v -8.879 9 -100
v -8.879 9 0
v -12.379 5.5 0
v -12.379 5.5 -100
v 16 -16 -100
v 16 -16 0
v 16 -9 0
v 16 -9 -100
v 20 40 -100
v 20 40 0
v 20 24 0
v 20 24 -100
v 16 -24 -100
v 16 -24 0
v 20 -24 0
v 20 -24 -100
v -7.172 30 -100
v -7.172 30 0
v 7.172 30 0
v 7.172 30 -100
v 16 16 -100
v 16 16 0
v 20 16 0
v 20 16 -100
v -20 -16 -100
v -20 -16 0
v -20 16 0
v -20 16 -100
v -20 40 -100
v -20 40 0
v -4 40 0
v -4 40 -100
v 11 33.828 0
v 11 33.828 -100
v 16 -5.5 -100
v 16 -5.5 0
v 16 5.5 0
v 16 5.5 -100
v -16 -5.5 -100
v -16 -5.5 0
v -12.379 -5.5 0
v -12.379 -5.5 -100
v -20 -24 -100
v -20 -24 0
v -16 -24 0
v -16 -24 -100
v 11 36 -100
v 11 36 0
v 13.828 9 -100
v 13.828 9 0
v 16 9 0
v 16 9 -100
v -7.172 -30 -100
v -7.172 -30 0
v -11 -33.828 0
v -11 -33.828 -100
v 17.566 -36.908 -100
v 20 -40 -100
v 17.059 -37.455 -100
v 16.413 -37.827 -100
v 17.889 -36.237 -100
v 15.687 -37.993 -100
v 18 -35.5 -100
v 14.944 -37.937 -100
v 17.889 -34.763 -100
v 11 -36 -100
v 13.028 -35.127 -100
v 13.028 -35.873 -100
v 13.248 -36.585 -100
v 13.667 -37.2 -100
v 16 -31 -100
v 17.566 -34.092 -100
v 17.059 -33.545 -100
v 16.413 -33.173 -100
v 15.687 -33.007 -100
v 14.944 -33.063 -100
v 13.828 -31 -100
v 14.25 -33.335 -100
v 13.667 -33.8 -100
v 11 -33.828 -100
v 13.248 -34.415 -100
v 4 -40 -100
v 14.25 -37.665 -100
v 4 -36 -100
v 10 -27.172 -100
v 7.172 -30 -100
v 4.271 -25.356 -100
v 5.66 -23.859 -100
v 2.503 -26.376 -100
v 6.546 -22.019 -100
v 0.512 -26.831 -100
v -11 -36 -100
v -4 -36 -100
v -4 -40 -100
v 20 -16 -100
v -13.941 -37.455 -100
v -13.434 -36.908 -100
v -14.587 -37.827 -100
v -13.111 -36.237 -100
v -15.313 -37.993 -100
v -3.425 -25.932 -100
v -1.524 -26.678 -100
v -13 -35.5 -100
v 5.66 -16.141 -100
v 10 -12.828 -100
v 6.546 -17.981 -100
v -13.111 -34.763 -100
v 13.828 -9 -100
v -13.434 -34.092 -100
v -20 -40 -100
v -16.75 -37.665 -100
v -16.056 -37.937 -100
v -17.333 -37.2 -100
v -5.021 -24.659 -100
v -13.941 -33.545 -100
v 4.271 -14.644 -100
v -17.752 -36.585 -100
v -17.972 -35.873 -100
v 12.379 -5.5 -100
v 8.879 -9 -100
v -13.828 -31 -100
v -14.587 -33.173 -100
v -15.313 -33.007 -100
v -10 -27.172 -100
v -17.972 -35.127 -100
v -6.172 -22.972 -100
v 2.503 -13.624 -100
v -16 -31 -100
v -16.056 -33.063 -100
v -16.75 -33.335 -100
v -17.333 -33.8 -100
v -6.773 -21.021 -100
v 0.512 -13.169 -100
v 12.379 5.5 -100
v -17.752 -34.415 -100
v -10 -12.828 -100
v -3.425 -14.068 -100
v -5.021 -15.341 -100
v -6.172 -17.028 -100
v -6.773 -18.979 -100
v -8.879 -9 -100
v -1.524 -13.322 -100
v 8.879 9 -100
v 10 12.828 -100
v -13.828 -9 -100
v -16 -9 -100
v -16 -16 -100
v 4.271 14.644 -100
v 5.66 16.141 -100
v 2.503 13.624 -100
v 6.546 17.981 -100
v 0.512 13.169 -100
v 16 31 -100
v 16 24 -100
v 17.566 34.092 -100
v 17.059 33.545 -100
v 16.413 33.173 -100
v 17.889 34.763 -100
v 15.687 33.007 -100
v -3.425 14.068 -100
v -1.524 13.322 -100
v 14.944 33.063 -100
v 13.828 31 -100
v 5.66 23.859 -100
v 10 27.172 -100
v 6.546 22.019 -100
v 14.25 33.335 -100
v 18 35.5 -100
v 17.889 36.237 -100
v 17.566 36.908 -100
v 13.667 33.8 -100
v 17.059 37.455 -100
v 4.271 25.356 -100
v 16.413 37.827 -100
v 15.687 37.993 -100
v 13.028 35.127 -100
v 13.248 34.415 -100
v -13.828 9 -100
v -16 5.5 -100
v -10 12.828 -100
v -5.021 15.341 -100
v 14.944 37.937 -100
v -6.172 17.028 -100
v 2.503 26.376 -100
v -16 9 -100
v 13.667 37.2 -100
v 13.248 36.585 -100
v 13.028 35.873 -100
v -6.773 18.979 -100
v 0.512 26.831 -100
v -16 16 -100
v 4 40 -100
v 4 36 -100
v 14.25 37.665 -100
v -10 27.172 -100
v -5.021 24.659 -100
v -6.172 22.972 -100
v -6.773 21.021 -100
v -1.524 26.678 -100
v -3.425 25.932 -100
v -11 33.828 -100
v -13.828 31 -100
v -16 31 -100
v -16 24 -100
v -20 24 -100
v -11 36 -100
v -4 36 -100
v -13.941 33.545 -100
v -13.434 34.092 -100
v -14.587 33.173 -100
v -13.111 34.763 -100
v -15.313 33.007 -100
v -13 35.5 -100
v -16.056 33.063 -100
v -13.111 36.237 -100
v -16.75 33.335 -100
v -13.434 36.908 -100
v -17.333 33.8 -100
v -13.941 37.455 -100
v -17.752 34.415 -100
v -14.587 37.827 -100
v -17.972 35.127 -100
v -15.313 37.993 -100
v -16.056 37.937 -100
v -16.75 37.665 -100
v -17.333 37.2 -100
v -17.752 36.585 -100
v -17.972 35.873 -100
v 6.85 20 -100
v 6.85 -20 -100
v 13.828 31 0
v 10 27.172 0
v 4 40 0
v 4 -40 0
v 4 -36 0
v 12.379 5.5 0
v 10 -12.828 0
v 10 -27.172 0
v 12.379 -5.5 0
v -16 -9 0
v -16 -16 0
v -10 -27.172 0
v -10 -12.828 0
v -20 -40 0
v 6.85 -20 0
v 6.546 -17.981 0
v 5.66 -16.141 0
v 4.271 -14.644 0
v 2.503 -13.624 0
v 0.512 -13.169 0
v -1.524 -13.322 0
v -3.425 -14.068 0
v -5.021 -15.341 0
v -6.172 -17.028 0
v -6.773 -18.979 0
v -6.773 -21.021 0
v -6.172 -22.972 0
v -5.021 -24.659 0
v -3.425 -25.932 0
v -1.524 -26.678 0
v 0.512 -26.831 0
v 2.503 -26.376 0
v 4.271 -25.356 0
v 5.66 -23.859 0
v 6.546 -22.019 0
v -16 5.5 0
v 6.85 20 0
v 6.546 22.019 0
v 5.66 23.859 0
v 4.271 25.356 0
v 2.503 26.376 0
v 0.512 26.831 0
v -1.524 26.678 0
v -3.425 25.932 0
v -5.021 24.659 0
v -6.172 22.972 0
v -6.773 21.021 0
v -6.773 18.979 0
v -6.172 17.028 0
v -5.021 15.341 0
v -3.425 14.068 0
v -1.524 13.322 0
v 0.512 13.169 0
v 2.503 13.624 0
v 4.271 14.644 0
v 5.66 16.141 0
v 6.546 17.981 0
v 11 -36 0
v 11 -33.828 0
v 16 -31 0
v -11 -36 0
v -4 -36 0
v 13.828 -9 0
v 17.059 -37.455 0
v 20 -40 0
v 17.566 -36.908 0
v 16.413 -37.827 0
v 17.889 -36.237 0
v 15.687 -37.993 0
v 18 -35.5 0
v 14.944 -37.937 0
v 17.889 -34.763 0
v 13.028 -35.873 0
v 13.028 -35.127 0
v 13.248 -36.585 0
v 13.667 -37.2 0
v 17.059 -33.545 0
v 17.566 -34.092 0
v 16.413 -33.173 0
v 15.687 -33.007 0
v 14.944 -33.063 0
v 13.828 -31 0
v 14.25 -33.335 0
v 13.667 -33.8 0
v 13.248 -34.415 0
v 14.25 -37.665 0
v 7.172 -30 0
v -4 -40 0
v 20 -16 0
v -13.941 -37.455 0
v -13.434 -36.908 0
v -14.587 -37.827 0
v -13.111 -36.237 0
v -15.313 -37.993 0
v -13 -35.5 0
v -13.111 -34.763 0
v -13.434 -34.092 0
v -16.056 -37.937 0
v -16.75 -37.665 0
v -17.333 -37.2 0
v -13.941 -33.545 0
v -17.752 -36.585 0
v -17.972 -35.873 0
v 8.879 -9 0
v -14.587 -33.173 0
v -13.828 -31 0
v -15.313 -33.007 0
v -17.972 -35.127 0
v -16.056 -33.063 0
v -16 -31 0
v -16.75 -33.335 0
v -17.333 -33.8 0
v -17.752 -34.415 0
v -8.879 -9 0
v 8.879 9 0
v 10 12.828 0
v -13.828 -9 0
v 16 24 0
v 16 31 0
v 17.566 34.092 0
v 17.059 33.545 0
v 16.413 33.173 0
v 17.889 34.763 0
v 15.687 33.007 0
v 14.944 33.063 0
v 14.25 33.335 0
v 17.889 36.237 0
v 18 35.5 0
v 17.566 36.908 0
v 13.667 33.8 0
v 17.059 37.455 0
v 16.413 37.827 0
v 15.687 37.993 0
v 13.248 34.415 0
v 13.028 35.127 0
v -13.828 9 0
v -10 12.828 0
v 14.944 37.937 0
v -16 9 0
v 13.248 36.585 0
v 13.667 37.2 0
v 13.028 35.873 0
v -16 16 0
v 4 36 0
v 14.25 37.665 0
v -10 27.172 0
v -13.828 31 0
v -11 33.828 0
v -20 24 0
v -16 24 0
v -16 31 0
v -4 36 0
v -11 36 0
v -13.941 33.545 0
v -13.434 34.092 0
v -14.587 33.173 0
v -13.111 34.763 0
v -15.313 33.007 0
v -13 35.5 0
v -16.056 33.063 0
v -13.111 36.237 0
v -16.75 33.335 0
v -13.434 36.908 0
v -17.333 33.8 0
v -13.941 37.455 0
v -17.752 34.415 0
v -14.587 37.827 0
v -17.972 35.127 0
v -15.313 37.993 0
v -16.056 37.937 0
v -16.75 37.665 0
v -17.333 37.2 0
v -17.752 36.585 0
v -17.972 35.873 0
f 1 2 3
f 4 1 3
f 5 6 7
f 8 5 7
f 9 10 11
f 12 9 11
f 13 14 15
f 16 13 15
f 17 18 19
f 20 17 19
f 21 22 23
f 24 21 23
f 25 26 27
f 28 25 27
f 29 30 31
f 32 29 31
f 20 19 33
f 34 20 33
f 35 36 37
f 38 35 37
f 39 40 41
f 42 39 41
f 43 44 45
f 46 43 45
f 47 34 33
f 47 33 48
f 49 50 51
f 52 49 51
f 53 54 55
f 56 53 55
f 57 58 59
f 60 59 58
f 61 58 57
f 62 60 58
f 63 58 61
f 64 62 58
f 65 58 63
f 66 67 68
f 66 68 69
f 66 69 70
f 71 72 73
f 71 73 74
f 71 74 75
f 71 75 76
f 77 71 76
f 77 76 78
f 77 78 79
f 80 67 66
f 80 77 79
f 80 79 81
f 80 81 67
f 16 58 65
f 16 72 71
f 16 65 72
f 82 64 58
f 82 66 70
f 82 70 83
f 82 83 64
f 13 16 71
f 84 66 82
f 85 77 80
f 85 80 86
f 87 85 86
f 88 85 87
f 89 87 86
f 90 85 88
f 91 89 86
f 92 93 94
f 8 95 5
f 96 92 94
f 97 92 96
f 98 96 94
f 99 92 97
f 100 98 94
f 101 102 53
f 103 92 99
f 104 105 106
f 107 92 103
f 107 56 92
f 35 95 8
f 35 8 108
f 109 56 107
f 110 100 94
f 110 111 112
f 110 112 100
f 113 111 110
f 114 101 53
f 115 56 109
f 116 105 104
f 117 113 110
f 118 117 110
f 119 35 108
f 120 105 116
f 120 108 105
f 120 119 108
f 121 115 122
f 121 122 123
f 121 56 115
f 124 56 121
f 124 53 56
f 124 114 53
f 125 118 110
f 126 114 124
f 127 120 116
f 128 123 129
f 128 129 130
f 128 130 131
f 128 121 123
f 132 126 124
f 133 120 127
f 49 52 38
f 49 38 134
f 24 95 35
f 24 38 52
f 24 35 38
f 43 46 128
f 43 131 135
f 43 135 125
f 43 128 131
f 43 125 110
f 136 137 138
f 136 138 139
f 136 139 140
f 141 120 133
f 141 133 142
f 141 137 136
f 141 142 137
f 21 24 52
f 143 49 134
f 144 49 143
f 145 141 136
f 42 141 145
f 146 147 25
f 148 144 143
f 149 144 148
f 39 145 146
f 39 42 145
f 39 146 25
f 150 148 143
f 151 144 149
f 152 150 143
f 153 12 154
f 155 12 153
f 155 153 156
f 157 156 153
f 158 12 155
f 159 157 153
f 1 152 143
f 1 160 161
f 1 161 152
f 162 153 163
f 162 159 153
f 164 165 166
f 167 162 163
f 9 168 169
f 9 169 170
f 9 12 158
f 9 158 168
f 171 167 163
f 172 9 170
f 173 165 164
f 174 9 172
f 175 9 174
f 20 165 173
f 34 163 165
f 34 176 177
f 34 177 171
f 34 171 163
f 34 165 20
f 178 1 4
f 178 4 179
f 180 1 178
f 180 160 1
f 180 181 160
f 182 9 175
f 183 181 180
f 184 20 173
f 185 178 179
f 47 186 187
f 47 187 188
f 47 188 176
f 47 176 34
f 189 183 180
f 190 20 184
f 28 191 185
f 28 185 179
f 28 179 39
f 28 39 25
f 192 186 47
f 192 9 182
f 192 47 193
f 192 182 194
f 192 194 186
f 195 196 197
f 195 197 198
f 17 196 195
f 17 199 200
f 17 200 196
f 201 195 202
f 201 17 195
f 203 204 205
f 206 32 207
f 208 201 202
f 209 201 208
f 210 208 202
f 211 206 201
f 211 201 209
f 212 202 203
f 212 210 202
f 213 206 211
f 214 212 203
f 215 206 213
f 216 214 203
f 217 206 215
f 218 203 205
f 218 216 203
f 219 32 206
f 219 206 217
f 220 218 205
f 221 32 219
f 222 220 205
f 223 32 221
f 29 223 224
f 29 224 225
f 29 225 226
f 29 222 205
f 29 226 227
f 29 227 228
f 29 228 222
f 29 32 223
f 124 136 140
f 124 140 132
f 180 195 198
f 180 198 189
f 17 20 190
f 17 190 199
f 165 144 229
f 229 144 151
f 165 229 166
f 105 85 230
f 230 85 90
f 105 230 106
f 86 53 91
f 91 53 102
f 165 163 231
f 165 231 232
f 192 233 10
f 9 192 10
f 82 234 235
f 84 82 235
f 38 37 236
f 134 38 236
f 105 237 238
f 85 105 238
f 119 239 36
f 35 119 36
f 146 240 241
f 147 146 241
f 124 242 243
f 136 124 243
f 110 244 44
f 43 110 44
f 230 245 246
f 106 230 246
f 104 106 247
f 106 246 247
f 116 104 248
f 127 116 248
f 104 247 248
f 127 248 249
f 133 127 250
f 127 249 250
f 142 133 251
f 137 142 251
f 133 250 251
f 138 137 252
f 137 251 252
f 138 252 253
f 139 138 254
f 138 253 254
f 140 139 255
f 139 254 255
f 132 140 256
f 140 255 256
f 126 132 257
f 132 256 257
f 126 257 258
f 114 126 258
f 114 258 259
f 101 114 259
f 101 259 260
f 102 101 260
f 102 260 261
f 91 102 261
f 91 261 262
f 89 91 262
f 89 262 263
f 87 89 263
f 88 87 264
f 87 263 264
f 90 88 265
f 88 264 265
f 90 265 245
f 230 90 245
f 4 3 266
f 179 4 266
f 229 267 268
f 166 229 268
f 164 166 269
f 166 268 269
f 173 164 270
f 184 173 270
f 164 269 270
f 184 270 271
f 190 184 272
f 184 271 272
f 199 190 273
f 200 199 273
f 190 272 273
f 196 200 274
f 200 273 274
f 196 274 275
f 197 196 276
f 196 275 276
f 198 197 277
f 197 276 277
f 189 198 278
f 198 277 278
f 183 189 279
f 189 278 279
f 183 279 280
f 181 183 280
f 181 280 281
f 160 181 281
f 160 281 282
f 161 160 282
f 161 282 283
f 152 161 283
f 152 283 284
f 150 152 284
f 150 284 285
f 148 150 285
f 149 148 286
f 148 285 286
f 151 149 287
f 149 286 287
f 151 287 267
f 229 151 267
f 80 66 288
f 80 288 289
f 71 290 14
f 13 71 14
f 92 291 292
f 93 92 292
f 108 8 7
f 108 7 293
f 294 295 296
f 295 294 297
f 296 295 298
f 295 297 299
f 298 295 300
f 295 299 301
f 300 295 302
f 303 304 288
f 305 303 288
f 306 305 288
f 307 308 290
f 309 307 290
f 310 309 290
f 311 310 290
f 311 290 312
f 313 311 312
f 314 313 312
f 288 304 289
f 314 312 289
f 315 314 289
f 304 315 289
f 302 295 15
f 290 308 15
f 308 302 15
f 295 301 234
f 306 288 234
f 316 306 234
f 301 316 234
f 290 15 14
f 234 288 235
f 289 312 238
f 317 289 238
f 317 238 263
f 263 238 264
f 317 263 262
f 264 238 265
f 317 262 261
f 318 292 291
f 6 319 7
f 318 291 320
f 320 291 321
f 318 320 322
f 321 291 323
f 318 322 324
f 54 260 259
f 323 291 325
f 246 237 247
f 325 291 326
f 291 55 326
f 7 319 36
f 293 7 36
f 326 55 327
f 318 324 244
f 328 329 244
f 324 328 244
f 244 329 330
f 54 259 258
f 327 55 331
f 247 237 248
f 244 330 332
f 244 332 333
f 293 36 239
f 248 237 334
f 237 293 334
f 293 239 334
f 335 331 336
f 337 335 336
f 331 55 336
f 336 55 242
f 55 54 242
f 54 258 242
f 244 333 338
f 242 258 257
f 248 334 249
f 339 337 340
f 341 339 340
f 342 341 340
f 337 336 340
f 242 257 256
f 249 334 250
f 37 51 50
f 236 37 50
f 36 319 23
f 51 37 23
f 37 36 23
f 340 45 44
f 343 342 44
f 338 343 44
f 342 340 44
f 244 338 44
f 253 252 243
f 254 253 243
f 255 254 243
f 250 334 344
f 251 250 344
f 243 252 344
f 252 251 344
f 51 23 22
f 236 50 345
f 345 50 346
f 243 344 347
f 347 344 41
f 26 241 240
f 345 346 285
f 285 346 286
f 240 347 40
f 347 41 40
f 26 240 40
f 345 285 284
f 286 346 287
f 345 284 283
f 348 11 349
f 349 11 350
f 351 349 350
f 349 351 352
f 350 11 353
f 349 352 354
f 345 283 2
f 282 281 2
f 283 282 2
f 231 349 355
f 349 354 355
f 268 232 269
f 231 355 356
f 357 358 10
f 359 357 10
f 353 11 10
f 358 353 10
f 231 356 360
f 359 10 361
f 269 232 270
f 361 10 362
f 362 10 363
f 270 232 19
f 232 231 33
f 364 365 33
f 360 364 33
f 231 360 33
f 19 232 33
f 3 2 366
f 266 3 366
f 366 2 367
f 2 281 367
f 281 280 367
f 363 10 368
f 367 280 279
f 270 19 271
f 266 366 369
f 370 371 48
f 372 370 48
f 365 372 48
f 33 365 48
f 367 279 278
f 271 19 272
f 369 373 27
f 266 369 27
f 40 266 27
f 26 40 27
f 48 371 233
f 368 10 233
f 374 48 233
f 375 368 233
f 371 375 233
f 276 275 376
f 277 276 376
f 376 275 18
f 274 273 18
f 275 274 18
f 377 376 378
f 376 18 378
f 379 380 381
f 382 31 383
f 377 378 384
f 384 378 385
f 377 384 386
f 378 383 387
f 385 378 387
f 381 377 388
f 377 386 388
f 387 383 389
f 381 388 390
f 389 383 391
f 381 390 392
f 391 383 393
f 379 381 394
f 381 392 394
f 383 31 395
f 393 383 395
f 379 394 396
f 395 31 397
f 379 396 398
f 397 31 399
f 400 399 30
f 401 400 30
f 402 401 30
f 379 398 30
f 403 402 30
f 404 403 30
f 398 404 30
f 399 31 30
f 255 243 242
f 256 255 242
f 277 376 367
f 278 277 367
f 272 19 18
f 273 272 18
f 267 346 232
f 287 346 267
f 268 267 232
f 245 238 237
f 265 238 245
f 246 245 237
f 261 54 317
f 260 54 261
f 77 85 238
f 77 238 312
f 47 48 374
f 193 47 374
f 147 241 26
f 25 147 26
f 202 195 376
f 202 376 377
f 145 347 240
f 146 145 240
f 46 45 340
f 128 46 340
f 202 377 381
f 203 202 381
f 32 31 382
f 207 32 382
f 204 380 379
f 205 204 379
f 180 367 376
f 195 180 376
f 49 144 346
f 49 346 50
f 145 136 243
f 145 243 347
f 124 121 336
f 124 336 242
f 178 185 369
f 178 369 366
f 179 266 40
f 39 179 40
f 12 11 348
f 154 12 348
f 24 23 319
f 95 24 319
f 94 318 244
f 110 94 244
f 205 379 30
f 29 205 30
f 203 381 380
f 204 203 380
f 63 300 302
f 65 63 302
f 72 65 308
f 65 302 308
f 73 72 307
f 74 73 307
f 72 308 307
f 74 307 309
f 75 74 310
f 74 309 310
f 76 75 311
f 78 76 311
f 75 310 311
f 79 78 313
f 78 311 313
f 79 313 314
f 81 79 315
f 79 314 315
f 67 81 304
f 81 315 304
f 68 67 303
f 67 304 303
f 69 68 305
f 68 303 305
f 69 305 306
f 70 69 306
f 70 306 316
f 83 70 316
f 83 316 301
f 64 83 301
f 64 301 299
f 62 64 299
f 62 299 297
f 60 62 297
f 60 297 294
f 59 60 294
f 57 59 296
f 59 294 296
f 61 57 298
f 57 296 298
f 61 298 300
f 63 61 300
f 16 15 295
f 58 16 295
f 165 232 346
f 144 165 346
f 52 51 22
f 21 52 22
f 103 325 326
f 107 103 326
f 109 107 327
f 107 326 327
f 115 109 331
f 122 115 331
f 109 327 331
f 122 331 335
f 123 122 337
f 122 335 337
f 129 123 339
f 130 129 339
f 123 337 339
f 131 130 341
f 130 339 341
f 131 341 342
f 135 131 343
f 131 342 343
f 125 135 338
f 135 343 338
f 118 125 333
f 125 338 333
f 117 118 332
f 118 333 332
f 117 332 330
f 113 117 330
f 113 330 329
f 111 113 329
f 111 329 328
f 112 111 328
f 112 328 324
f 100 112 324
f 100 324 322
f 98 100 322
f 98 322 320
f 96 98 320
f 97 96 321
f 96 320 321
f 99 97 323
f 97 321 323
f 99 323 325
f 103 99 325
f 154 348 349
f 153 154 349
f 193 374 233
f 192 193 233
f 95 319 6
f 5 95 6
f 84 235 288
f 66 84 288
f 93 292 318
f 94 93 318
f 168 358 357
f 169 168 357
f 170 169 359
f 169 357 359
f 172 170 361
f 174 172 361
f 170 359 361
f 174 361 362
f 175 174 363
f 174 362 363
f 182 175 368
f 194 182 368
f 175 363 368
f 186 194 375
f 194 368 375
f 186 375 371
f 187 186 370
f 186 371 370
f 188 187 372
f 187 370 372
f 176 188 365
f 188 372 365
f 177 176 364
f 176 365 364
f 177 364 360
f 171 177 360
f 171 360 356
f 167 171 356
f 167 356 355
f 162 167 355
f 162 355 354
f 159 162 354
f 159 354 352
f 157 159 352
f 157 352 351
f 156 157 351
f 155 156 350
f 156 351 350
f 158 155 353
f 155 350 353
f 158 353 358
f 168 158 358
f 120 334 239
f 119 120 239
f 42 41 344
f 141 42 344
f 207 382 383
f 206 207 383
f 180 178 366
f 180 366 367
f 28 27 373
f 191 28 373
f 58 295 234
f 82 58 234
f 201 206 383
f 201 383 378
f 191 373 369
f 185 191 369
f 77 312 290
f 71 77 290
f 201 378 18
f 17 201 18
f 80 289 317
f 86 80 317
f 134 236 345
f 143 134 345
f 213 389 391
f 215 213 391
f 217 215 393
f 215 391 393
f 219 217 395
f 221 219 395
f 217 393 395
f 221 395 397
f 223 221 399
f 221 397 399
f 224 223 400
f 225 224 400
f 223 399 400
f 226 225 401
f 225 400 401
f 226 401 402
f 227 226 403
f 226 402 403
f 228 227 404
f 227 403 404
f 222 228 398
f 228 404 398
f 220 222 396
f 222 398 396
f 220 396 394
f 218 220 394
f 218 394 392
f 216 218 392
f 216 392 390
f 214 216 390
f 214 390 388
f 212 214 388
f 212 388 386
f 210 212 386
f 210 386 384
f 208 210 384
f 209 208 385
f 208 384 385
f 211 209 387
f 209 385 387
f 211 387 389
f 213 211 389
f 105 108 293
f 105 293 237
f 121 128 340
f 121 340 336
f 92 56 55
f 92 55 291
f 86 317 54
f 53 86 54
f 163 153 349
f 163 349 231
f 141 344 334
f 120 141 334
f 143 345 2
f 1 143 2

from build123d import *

# Parameters (mm, degrees)
SKETCH1_R      = 2.5
SKETCH1_R_2    = 6.85
EXTRUDE1_DEPTH = 100


with BuildPart() as part:
    # Sketch1 → Extrude1 (new body)
    with BuildSketch(Plane.XY):
        Polygon((-20, -24), (-16, -24), (-16, -31), (-13.828427, -31), (-10, -27.171573), (-10, -12.828427), (-13.828427, -9), (-16, -9), (-16, -16), (-20, -16), (-20, 16), (-16, 16), (-16, 9), (-13.828427, 9), (-10, 12.828427), (-10, 27.171573), (-13.828427, 31), (-16, 31), (-16, 24), (-20, 24), (-20, 40), (-4, 40), (-4, 36), (-11, 36), (-11, 33.828427), (-7.171573, 30), (7.171573, 30), (11, 33.828427), (11, 36), (4, 36), (4, 40), (20, 40), (20, 24), (16, 24), (16, 31), (13.828427, 31), (10, 27.171573), (10, 12.828427), (13.828427, 9), (16, 9), (16, 16), (20, 16), (20, -16), (16, -16), (16, -9), (13.828427, -9), (10, -12.828427), (10, -27.171573), (13.828427, -31), (16, -31), (16, -24), (20, -24), (20, -40), (4, -40), (4, -36), (11, -36), (11, -33.828427), (7.171573, -30), (-7.171573, -30), (-11, -33.828427), (-11, -36), (-4, -36), (-4, -40), (-20, -40), align=None)
        with Locations((-15.5, -35.5)):
            Circle(SKETCH1_R, mode=Mode.SUBTRACT)
        with Locations((-15.5, 35.5)):
            Circle(SKETCH1_R, mode=Mode.SUBTRACT)
        with Locations((15.5, -35.5)):
            Circle(SKETCH1_R, mode=Mode.SUBTRACT)
        with Locations((15.5, 35.5)):
            Circle(SKETCH1_R, mode=Mode.SUBTRACT)
        with Locations((0, -20)):
            Circle(SKETCH1_R_2, mode=Mode.SUBTRACT)
        with Locations((0, 20)):
            Circle(SKETCH1_R_2, mode=Mode.SUBTRACT)
        Polygon((-8.87868, -9), (8.87868, -9), (12.37868, -5.5), (16, -5.5), (16, 5.5), (12.37868, 5.5), (8.87868, 9), (-8.87868, 9), (-12.37868, 5.5), (-16, 5.5), (-16, -5.5), (-12.37868, -5.5), align=None, mode=Mode.SUBTRACT)
    extrude(amount=-EXTRUDE1_DEPTH)


solid = part.part
